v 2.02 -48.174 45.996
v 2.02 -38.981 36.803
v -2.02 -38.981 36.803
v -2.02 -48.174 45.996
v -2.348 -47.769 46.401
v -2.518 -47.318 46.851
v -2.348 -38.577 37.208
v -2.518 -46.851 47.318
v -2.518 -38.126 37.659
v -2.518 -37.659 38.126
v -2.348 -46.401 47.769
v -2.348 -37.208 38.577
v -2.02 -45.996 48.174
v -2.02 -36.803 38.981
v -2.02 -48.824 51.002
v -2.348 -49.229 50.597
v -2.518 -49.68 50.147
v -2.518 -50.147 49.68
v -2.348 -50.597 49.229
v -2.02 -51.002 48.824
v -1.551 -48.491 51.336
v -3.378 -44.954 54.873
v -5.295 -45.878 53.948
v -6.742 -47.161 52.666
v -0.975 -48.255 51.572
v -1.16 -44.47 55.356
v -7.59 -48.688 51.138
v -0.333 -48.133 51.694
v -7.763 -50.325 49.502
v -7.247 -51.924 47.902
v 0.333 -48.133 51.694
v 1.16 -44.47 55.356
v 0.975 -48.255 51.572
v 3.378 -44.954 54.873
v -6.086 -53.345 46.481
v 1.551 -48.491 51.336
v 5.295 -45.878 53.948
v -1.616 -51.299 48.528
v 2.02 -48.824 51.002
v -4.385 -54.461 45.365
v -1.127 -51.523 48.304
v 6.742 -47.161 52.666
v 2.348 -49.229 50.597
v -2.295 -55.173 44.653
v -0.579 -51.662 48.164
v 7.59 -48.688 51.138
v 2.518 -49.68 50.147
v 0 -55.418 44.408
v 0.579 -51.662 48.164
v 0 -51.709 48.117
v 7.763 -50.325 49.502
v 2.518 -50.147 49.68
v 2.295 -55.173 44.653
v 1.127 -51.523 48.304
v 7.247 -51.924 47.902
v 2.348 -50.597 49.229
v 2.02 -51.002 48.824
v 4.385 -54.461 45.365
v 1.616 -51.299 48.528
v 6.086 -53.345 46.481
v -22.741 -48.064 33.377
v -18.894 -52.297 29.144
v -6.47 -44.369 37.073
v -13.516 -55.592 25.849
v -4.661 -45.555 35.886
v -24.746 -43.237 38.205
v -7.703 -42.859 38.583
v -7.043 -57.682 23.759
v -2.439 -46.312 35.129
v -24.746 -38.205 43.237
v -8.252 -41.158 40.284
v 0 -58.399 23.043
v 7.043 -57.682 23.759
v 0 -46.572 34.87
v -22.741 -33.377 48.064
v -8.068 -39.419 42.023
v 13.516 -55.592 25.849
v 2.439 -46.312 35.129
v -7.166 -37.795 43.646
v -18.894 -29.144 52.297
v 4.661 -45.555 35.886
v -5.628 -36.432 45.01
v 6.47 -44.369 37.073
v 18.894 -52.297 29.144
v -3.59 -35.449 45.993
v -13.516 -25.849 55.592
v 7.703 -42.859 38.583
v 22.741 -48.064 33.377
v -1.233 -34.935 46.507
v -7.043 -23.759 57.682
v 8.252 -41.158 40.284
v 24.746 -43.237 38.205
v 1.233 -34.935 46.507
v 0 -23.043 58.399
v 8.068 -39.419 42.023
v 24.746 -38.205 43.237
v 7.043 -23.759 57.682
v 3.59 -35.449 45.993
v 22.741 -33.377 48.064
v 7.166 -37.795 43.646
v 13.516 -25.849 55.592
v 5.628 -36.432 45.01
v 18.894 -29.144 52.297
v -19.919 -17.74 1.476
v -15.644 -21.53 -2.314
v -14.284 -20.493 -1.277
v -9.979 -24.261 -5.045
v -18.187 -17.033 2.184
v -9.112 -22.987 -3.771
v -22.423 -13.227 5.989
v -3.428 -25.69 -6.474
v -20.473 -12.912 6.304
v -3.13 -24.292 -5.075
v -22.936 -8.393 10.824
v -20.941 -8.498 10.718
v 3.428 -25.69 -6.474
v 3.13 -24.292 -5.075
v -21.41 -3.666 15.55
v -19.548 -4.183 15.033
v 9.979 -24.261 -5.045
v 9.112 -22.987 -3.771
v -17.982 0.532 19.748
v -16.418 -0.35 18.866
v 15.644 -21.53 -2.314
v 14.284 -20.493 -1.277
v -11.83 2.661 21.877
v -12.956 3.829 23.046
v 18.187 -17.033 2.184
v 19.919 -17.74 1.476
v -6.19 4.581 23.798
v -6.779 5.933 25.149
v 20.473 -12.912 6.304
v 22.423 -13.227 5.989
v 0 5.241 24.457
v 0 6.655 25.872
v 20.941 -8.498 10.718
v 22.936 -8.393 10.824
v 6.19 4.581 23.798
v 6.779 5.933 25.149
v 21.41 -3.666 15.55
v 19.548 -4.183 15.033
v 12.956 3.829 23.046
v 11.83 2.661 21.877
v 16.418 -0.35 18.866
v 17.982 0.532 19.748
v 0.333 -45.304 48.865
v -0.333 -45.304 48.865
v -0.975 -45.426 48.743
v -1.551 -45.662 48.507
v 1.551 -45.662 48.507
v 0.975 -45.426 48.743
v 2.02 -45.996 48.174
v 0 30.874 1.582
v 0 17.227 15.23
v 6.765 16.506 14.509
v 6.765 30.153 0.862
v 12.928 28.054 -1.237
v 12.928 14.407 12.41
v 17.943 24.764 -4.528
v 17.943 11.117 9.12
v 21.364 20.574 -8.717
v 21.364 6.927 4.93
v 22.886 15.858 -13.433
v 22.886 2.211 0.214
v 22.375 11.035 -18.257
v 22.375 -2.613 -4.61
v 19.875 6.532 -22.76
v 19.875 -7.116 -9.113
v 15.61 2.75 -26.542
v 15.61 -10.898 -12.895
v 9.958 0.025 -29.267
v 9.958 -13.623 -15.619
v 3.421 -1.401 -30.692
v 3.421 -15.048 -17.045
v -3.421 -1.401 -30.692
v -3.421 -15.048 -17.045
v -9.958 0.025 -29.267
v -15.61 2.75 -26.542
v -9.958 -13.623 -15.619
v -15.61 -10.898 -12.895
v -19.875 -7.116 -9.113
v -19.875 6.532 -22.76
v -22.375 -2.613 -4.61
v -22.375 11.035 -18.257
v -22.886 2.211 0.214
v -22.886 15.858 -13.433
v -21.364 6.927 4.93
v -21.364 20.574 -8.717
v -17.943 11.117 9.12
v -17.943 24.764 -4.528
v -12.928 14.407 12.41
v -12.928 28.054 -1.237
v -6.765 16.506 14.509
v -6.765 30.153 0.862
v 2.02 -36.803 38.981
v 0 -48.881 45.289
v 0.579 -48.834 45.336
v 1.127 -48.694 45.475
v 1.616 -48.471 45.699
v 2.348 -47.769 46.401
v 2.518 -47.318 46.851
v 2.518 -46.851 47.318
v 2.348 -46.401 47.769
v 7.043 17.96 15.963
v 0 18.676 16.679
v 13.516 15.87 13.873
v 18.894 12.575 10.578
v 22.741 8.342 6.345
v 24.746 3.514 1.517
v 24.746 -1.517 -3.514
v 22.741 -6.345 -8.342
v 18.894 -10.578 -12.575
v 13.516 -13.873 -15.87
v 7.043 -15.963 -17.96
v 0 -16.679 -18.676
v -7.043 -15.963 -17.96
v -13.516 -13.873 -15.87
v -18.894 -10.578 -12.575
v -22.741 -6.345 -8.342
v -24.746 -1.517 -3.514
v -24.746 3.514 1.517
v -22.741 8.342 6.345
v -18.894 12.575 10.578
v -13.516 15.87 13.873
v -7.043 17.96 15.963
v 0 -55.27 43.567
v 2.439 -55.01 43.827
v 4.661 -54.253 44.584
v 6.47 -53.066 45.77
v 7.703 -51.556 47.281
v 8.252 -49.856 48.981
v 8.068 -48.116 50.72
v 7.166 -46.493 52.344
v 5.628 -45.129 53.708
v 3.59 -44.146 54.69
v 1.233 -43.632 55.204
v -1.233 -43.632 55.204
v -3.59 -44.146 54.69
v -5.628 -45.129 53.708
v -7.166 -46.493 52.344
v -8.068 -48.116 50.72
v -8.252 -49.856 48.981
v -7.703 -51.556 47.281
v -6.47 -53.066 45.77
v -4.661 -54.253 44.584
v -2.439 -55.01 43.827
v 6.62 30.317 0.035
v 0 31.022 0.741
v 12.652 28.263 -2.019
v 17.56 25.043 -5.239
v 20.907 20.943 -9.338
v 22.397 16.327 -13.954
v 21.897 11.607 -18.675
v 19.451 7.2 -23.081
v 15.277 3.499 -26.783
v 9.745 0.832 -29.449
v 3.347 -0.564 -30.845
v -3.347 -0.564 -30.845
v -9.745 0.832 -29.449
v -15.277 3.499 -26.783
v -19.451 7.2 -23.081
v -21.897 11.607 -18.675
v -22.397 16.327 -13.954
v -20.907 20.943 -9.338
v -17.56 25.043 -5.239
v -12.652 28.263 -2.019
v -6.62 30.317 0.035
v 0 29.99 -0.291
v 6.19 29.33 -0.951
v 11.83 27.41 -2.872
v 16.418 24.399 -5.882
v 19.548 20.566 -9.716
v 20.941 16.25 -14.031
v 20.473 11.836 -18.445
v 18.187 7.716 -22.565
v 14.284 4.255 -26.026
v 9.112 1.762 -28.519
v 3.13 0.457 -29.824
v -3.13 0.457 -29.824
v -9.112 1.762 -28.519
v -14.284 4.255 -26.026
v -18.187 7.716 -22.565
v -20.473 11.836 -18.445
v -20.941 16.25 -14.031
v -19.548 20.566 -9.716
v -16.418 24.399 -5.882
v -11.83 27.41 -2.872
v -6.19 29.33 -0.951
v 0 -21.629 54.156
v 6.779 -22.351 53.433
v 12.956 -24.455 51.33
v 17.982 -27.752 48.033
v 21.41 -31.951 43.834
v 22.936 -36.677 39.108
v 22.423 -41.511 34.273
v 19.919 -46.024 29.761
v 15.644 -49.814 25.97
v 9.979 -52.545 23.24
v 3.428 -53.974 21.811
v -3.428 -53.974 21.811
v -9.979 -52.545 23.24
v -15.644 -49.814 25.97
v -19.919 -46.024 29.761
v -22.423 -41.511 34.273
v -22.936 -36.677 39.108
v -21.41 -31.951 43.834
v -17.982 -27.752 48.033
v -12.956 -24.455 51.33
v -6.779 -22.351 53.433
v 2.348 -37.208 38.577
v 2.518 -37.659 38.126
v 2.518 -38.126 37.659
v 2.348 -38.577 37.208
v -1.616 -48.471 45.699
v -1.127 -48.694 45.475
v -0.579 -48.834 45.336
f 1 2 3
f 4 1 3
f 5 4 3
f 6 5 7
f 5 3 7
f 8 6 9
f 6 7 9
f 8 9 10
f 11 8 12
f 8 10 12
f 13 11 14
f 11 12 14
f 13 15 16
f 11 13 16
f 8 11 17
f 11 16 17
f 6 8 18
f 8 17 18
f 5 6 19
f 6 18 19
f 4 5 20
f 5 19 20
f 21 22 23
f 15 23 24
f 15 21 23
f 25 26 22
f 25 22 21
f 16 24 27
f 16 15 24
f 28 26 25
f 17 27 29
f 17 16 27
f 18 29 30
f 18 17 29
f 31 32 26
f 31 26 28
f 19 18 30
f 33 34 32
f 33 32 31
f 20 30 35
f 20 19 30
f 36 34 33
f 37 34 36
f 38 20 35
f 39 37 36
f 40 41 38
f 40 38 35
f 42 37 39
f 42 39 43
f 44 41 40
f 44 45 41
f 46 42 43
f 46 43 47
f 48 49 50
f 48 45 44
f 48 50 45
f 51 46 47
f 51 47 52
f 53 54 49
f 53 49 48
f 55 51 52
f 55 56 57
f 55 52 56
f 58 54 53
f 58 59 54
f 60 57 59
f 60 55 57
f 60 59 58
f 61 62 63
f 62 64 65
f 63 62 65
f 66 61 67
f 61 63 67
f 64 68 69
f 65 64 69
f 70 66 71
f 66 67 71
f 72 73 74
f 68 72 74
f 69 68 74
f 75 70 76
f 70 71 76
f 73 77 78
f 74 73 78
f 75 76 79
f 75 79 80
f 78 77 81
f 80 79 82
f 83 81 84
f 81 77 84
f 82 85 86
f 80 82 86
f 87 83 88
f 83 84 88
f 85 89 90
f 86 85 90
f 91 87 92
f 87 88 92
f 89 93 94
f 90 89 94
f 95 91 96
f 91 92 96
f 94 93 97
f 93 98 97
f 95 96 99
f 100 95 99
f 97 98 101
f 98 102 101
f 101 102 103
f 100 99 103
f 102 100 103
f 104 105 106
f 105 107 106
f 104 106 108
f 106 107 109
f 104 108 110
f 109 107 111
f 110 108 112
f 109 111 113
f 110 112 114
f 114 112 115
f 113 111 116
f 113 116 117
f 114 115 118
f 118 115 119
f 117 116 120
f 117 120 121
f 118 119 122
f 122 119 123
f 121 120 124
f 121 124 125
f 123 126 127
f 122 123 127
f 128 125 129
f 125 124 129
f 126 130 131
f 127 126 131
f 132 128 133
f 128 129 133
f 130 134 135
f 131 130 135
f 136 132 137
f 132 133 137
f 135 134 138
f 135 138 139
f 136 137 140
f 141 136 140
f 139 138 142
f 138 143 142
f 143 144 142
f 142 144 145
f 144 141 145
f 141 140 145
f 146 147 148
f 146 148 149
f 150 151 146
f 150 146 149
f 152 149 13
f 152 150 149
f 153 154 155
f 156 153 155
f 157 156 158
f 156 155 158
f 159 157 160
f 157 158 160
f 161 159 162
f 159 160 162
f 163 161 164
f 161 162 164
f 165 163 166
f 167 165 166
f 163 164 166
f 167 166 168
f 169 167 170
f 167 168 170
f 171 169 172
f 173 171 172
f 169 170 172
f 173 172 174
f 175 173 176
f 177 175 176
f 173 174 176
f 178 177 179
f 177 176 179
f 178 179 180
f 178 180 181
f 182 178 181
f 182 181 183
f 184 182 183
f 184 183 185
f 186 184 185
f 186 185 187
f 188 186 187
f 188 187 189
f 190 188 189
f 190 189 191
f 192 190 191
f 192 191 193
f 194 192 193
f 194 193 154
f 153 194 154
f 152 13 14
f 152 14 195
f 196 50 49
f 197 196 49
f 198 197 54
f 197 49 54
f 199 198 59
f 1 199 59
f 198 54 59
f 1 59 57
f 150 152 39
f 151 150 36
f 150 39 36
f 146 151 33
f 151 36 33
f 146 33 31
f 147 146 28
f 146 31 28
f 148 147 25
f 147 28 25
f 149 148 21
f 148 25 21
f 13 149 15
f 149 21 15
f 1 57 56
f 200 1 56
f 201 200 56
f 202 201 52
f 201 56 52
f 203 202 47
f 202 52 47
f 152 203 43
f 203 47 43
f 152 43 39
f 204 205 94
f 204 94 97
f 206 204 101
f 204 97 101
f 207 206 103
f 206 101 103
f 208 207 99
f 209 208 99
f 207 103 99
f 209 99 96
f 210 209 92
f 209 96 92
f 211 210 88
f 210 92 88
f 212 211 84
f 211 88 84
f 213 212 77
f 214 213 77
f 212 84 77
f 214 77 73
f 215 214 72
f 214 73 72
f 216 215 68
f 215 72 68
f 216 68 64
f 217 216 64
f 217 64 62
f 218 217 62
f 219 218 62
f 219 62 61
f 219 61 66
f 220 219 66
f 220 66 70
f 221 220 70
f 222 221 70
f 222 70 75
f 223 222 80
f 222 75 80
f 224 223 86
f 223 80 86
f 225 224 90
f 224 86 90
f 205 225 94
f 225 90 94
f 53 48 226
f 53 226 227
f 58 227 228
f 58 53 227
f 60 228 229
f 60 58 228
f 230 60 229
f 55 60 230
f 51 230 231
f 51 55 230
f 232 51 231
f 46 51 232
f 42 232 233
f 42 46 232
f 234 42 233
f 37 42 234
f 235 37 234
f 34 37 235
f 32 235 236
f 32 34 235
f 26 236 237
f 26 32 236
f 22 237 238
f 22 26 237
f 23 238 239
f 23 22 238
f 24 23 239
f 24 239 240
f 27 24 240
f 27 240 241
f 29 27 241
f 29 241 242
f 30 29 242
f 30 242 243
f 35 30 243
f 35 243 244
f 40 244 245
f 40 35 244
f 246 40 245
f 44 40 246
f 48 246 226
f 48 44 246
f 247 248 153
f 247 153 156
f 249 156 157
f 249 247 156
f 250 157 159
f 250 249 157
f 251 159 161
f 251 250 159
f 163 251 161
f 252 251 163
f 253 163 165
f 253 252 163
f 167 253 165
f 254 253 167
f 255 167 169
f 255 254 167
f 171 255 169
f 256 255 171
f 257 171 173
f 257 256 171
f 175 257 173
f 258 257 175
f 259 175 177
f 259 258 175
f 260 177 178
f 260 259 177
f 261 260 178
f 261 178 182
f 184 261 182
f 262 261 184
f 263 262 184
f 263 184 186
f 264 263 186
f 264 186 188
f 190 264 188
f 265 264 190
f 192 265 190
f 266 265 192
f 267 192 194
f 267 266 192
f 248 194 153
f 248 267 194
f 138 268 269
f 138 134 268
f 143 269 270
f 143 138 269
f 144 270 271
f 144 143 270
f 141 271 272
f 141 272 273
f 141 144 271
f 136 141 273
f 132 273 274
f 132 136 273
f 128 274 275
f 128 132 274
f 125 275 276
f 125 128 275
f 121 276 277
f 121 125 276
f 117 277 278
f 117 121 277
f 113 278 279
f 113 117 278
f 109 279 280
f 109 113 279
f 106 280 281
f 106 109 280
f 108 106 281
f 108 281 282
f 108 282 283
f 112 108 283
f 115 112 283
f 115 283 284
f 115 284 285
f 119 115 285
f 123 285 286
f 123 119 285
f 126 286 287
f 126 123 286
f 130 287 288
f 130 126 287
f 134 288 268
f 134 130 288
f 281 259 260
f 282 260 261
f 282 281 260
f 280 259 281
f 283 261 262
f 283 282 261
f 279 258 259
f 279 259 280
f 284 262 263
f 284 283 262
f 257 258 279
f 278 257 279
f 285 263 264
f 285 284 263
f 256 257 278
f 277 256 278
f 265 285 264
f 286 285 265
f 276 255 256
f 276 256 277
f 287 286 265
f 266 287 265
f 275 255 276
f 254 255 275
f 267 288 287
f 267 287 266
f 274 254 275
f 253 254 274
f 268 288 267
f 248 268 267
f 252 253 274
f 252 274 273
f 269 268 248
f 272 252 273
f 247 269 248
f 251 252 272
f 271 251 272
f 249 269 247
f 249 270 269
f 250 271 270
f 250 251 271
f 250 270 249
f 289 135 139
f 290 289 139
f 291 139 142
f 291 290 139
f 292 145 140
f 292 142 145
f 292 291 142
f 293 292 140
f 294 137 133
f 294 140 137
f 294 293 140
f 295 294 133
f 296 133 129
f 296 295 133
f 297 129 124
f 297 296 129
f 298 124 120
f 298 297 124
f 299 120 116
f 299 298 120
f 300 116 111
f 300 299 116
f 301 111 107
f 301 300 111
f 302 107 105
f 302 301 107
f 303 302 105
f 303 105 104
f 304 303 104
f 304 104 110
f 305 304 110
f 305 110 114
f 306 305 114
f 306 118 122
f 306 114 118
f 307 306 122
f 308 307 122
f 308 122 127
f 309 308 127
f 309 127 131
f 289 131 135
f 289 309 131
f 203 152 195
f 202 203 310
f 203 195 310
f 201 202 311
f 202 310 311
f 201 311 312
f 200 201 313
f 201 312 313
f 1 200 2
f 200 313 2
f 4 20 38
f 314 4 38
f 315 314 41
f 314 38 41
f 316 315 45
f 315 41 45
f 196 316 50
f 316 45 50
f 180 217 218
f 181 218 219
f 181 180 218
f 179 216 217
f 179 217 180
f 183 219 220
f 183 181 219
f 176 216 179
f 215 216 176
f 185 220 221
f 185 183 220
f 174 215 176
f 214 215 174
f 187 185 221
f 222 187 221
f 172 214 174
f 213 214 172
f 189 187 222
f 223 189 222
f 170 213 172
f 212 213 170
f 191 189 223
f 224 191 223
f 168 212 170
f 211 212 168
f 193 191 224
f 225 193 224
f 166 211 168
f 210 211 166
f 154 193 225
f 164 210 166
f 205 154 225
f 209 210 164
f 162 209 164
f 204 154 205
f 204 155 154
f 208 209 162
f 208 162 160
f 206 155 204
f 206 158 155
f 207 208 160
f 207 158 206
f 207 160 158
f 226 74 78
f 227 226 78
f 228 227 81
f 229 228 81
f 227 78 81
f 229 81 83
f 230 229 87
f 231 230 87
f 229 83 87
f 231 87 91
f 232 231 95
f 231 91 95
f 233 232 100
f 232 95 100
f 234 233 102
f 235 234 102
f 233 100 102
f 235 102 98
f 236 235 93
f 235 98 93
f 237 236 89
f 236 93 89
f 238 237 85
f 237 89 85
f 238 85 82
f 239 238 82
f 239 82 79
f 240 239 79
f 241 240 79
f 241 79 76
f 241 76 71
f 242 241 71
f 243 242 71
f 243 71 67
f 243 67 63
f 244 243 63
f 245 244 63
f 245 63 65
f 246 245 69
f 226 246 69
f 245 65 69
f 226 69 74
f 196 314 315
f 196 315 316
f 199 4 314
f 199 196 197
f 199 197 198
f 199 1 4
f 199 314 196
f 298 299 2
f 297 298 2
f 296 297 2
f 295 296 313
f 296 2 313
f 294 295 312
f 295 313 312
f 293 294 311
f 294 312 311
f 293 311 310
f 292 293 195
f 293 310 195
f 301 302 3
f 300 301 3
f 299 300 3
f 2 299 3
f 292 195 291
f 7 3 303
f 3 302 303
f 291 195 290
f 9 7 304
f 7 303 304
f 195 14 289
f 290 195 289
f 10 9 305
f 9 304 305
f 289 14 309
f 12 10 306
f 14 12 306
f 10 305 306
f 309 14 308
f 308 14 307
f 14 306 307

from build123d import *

# Parameters (mm, degrees)
BOSS_EXTRUDE7_DEPTH       = 9
BOSS_EXTRUDE7_DEPTH_BACK  = 50
SKETCH4_R                 = 25
SKETCH4_R_2               = 23
SKETCH20_R                = 8.275
BOSS_EXTRUDE16_DEPTH      = 13
SKETCH24_R                = 2.54
CUT_EXTRUDE10_DEPTH       = 4
SKETCH20_17_R             = 25
BOSS_EXTRUDE17_DEPTH      = 4
CUT_EXTRUDE9_DEPTH        = 30
CUT_EXTRUDE9_DEPTH_BACK   = 30
BOSS_EXTRUDE18_DEPTH      = 20
BOSS_EXTRUDE18_DEPTH_BACK = 15
SKETCH26_R                = 22.95
SKETCH26_R_2              = 21
BOSS_EXTRUDE19_START      = -15
SKETCH27_R                = 25
SKETCH27_R_2              = 21
BOSS_EXTRUDE19_DEPTH      = 15
CHAMFER1_SIZE             = 0.7
CHAMFER1_SIZE2            = 0.490145277
CHAMFER2_SIZE             = 0.7
CHAMFER2_SIZE2            = 0.490145277


with BuildPart() as part:
    # Sketch4 → Boss-Extrude7 (new, two sides: drawn at the far end of the back side and taken through both)
    with BuildSketch(Plane(origin=(0, -5.365491749, 5.365491749), x_dir=(-1, 0, 0), z_dir=(0, 0.7071067811865458, -0.7071067811865492)).offset(-BOSS_EXTRUDE7_DEPTH_BACK)):
        with Locations(Location((0, 0, 0), (0, 0, 90))):
            Circle(SKETCH4_R)
        with Locations(Location((0, 0, 0), (0, 0, 90))):
            Circle(SKETCH4_R_2, mode=Mode.SUBTRACT)
    extrude(amount=BOSS_EXTRUDE7_DEPTH + BOSS_EXTRUDE7_DEPTH_BACK)



with BuildPart() as body_2:
    # Sketch20 → Boss-Extrude16 (new body)
    with BuildSketch(Plane(origin=(0, -40.720830808, 40.720830808), x_dir=(1, 0, 0), z_dir=(0, -0.7071067811865457, 0.7071067811865495))):
        with Locations(Location((0, 0, 0), (0, 0, 270))):
            Circle(SKETCH20_R)
    extrude(amount=BOSS_EXTRUDE16_DEPTH)

    # Sketch24 → Cut-Extrude10 (cut)
    with BuildSketch(Plane(origin=(0, -49.913218964, 49.913218964), x_dir=(1, 0, 0), z_dir=(0, -0.7071067811865457, 0.7071067811865493))):
        with Locations(Location((0, 0, 0), (0, 0, 270))):
            Circle(SKETCH24_R)
    extrude(amount=-CUT_EXTRUDE10_DEPTH, mode=Mode.SUBTRACT)


with BuildPart() as part_1:
    add(part.part)

    add(body_2.part)  # Boss-Extrude17 merges body 2
    # Sketch20<17> → Boss-Extrude17 (add)
    with BuildSketch(Plane(origin=(0, -40.720830808, 40.720830808), x_dir=(1, 0, 0), z_dir=(0, -0.7071067811865457, 0.7071067811865495))):
        with Locations(Location((0, 0, 0), (0, 0, 90))):
            Circle(SKETCH20_17_R)
    extrude(amount=-BOSS_EXTRUDE17_DEPTH)

    # Sketch20<15> → Cut-Extrude9 (cut, two sides: drawn at the far end of the back side and taken through both)
    with BuildSketch(Plane(origin=(0, -40.720830808, 40.720830808), x_dir=(1, 0, 0), z_dir=(0, -0.7071067811865457, 0.7071067811865495)).offset(-CUT_EXTRUDE9_DEPTH_BACK)):
        with BuildLine():
            Line((-2.019900988, 1.54), (2.019900988, 1.54))
            ThreePointArc((2.019900988, 1.54), (2.54, 0), (2.019900988, -1.54))
            Line((2.019900988, -1.54), (-2.019900988, -1.54))
            ThreePointArc((-2.019900988, -1.54), (-2.54, 0), (-2.019900988, 1.54))
        make_face()
    extrude(amount=CUT_EXTRUDE9_DEPTH + CUT_EXTRUDE9_DEPTH_BACK, mode=Mode.SUBTRACT)



with BuildPart() as body_2_2:
    # Sketch26 → Boss-Extrude18 (new, two sides: drawn at the far end of the back side and taken through both)
    with BuildSketch(Plane(origin=(0, 0.998469282, -0.998469282), x_dir=(1, 0, 0), z_dir=(0, 0.7071067811865458, -0.7071067811865492)).offset(-BOSS_EXTRUDE18_DEPTH_BACK)):
        with Locations(Location((0, 0, 0), (0, 0, 270))):
            Circle(SKETCH26_R)
        with Locations(Location((0, 0, 0), (0, 0, 270))):
            Circle(SKETCH26_R_2, mode=Mode.SUBTRACT)
    extrude(amount=BOSS_EXTRUDE18_DEPTH + BOSS_EXTRUDE18_DEPTH_BACK)


with BuildPart() as part_2:
    add(part_1.part)

    add(body_2_2.part)  # Boss-Extrude19 merges body 2 2
    # Sketch27 → Boss-Extrude19 (add)
    with BuildSketch(Plane(origin=(0, 0.998469282, -0.998469282), x_dir=(1, 0, 0), z_dir=(0, 0.7071067811865458, -0.7071067811865492)).offset(BOSS_EXTRUDE19_START)):
        with Locations(Location((0, 0, 0), (0, 0, 270))):
            Circle(SKETCH27_R)
        with Locations(Location((0, 0, 0), (0, 0, 270))):
            Circle(SKETCH27_R_2, mode=Mode.SUBTRACT)
    extrude(amount=BOSS_EXTRUDE19_DEPTH)

    # Chamfer1
    chamfer1_edges = [part_2.edges().sort_by_distance(p)[0] for p in [
        (0, -1.087495723, -31.368705534),
    ]]
    chamfer1_side = [part_2.faces().sort_by_distance(p)[0] for p in [
        (0, -8.158563535, -24.297637722),
    ]]
    chamfer(chamfer1_edges, length=CHAMFER1_SIZE, length2=CHAMFER1_SIZE2, reference=chamfer1_side[0])

    # Chamfer2
    chamfer2_edges = [part_2.edges().sort_by_distance(p)[0] for p in [
        (0, -44.06191035, 55.764527578),
    ]]
    chamfer2_side = [part_2.faces().sort_by_distance(p)[0] for p in [
        (0, -39.465716272, 51.1683335),
    ]]
    chamfer(chamfer2_edges, length=CHAMFER2_SIZE, length2=CHAMFER2_SIZE2, reference=chamfer2_side[0])


solid = part_2.part
